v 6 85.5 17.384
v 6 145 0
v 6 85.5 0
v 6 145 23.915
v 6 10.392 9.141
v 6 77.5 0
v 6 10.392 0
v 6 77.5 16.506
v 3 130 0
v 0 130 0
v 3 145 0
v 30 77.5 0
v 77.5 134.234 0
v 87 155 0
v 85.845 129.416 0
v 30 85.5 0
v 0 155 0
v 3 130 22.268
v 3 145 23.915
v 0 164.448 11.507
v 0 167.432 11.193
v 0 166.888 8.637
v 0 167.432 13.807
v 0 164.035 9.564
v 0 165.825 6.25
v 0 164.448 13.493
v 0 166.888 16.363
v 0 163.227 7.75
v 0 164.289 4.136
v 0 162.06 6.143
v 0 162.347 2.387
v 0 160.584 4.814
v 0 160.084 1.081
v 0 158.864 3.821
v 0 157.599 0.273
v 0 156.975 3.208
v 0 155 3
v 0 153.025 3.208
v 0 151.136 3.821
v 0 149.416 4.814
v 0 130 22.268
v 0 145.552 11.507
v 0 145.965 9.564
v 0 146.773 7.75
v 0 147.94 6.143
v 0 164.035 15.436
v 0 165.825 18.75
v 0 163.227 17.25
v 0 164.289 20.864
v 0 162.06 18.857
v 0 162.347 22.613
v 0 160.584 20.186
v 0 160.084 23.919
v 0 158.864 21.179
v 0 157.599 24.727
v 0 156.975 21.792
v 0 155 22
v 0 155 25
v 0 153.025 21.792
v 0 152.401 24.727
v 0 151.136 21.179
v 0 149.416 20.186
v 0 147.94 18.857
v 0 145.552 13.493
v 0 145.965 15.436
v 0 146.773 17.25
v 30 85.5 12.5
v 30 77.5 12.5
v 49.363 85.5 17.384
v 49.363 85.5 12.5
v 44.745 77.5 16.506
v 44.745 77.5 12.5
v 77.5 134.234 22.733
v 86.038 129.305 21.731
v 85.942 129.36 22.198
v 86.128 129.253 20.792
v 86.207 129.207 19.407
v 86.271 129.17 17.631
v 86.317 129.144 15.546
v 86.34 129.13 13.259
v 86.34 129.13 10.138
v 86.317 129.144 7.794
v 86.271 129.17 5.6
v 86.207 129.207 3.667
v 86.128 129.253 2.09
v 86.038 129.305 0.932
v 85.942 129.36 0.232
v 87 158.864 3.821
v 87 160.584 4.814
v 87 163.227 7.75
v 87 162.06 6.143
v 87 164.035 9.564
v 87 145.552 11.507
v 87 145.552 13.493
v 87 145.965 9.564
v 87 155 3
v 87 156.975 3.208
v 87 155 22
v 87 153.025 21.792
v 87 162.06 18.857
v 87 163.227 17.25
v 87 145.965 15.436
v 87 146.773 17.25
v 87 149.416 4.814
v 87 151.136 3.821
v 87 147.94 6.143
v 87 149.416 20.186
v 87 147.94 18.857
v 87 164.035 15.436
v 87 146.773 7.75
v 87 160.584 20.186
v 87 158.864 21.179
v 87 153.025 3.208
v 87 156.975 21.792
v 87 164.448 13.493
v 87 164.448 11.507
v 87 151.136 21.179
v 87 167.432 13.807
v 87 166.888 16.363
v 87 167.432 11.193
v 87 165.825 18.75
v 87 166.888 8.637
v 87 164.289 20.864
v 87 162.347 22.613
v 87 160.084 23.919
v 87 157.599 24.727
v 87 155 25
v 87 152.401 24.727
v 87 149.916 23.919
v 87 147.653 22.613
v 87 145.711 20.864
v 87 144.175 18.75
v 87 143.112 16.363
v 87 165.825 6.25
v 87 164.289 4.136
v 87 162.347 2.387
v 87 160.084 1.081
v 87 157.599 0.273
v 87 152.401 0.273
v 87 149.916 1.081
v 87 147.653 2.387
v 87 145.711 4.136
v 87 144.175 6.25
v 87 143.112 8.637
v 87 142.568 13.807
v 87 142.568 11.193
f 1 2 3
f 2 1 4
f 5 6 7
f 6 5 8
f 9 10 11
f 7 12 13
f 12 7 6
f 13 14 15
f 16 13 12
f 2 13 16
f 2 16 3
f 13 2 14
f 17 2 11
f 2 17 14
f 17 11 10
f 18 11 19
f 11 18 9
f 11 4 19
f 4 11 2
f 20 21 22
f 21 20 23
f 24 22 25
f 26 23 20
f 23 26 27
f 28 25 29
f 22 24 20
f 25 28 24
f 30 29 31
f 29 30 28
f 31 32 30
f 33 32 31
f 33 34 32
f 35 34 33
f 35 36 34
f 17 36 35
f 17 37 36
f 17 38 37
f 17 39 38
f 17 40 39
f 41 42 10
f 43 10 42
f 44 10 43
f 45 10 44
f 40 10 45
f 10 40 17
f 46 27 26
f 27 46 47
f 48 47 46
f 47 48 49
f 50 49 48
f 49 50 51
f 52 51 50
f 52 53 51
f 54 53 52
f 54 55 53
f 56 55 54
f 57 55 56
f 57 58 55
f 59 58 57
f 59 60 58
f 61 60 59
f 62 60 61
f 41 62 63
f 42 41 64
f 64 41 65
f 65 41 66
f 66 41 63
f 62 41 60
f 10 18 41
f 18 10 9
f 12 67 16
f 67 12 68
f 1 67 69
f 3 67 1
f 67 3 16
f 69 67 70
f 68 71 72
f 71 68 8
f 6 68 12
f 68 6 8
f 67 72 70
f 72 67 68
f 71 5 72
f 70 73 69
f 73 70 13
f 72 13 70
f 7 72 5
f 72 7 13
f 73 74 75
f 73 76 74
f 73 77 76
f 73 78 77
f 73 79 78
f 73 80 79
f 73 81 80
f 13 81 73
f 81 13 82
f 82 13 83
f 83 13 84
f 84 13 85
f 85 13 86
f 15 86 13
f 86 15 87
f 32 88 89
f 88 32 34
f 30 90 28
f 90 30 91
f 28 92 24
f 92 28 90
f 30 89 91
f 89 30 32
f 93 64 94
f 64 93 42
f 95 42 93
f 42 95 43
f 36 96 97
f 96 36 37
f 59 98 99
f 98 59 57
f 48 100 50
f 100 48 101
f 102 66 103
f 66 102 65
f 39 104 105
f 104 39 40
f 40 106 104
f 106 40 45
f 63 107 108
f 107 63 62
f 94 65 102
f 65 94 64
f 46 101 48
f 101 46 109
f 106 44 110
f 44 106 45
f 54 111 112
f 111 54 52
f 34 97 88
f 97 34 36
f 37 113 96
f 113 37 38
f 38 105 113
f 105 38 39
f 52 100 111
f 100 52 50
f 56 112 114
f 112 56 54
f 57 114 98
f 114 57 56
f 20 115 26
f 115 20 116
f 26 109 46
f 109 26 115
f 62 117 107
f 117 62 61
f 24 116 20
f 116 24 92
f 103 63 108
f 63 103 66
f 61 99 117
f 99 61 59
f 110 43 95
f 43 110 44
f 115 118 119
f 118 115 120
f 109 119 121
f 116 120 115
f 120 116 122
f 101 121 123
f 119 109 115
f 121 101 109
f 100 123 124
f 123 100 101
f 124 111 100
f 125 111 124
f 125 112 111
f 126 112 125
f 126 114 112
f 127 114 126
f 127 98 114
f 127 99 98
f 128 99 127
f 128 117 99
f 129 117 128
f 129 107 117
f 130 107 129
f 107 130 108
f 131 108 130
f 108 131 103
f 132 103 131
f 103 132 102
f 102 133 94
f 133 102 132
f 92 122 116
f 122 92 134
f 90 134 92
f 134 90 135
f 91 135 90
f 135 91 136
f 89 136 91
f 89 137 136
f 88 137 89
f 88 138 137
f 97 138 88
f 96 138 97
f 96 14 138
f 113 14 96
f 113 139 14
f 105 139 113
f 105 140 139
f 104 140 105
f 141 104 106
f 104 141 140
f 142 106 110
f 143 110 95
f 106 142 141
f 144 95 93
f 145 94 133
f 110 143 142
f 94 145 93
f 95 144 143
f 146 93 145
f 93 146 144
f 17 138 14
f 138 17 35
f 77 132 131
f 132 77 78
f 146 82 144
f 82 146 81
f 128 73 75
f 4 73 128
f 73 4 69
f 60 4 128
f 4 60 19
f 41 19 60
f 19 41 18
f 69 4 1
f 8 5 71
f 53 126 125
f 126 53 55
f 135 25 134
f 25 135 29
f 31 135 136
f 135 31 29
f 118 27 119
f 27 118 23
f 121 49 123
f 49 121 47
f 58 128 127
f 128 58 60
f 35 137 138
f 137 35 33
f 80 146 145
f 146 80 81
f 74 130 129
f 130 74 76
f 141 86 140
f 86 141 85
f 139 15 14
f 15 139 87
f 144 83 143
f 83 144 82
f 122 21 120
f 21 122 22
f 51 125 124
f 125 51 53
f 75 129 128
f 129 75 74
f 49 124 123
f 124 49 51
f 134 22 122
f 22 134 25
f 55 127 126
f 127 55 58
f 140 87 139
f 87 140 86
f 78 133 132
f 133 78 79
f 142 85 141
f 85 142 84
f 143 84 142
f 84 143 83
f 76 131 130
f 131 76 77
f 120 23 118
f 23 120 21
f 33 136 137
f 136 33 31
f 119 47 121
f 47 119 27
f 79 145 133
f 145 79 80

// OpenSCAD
// file: veriables.scad
aluminum_width			= 20;
wall_thickness			= 3;
depth						= 20;
smooth_rod				= 10;
long_bearing_od			= 19;
long_bearing_length		= 29;
bearing_outer			= 22;
bearing_inner			= 8;
bearing_thick				= 7;
screw_diamiter			= 4;
motor_width				= 42.5;
motor_screw_space		= 31;

hotend_gap				= 6;
hotend_gap_dia			= 12;
hotend_top				= 3;
hotend_top_dia			= 16;

x_rod_spacing			= 60;

aluminum_plate_thick	= 3;
// main file
include <veriables.scad>;

module added(){
	hull(){
		translate([0,0,0]) cube([80,155,8]);
		translate([0,155,long_bearing_od/2+wall_thickness]) rotate([0,90,0]) cylinder(d=long_bearing_od+wall_thickness*2, h=long_bearing_length*3);
	}
}

module taken(){
	translate([aluminum_plate_thick,0,0]) cube([aluminum_plate_thick,145,long_bearing_od+wall_thickness*2]);
	cube([aluminum_plate_thick,130,long_bearing_od+wall_thickness*2]);
	#translate([0,155/2,0]) cube([30,8,long_bearing_od+wall_thickness*2]);
	translate([0,155/2,long_bearing_od/2+wall_thickness]) cube([80,8,long_bearing_od+wall_thickness*2]);
	rotate([0,0,-30])  cube([80,155,long_bearing_od+wall_thickness*2]);
	translate([0,155,long_bearing_od/2+wall_thickness]) rotate([0,90,0]) cylinder(d=long_bearing_od, h=long_bearing_length*3);
}

difference(){
	added();
	taken();
}
